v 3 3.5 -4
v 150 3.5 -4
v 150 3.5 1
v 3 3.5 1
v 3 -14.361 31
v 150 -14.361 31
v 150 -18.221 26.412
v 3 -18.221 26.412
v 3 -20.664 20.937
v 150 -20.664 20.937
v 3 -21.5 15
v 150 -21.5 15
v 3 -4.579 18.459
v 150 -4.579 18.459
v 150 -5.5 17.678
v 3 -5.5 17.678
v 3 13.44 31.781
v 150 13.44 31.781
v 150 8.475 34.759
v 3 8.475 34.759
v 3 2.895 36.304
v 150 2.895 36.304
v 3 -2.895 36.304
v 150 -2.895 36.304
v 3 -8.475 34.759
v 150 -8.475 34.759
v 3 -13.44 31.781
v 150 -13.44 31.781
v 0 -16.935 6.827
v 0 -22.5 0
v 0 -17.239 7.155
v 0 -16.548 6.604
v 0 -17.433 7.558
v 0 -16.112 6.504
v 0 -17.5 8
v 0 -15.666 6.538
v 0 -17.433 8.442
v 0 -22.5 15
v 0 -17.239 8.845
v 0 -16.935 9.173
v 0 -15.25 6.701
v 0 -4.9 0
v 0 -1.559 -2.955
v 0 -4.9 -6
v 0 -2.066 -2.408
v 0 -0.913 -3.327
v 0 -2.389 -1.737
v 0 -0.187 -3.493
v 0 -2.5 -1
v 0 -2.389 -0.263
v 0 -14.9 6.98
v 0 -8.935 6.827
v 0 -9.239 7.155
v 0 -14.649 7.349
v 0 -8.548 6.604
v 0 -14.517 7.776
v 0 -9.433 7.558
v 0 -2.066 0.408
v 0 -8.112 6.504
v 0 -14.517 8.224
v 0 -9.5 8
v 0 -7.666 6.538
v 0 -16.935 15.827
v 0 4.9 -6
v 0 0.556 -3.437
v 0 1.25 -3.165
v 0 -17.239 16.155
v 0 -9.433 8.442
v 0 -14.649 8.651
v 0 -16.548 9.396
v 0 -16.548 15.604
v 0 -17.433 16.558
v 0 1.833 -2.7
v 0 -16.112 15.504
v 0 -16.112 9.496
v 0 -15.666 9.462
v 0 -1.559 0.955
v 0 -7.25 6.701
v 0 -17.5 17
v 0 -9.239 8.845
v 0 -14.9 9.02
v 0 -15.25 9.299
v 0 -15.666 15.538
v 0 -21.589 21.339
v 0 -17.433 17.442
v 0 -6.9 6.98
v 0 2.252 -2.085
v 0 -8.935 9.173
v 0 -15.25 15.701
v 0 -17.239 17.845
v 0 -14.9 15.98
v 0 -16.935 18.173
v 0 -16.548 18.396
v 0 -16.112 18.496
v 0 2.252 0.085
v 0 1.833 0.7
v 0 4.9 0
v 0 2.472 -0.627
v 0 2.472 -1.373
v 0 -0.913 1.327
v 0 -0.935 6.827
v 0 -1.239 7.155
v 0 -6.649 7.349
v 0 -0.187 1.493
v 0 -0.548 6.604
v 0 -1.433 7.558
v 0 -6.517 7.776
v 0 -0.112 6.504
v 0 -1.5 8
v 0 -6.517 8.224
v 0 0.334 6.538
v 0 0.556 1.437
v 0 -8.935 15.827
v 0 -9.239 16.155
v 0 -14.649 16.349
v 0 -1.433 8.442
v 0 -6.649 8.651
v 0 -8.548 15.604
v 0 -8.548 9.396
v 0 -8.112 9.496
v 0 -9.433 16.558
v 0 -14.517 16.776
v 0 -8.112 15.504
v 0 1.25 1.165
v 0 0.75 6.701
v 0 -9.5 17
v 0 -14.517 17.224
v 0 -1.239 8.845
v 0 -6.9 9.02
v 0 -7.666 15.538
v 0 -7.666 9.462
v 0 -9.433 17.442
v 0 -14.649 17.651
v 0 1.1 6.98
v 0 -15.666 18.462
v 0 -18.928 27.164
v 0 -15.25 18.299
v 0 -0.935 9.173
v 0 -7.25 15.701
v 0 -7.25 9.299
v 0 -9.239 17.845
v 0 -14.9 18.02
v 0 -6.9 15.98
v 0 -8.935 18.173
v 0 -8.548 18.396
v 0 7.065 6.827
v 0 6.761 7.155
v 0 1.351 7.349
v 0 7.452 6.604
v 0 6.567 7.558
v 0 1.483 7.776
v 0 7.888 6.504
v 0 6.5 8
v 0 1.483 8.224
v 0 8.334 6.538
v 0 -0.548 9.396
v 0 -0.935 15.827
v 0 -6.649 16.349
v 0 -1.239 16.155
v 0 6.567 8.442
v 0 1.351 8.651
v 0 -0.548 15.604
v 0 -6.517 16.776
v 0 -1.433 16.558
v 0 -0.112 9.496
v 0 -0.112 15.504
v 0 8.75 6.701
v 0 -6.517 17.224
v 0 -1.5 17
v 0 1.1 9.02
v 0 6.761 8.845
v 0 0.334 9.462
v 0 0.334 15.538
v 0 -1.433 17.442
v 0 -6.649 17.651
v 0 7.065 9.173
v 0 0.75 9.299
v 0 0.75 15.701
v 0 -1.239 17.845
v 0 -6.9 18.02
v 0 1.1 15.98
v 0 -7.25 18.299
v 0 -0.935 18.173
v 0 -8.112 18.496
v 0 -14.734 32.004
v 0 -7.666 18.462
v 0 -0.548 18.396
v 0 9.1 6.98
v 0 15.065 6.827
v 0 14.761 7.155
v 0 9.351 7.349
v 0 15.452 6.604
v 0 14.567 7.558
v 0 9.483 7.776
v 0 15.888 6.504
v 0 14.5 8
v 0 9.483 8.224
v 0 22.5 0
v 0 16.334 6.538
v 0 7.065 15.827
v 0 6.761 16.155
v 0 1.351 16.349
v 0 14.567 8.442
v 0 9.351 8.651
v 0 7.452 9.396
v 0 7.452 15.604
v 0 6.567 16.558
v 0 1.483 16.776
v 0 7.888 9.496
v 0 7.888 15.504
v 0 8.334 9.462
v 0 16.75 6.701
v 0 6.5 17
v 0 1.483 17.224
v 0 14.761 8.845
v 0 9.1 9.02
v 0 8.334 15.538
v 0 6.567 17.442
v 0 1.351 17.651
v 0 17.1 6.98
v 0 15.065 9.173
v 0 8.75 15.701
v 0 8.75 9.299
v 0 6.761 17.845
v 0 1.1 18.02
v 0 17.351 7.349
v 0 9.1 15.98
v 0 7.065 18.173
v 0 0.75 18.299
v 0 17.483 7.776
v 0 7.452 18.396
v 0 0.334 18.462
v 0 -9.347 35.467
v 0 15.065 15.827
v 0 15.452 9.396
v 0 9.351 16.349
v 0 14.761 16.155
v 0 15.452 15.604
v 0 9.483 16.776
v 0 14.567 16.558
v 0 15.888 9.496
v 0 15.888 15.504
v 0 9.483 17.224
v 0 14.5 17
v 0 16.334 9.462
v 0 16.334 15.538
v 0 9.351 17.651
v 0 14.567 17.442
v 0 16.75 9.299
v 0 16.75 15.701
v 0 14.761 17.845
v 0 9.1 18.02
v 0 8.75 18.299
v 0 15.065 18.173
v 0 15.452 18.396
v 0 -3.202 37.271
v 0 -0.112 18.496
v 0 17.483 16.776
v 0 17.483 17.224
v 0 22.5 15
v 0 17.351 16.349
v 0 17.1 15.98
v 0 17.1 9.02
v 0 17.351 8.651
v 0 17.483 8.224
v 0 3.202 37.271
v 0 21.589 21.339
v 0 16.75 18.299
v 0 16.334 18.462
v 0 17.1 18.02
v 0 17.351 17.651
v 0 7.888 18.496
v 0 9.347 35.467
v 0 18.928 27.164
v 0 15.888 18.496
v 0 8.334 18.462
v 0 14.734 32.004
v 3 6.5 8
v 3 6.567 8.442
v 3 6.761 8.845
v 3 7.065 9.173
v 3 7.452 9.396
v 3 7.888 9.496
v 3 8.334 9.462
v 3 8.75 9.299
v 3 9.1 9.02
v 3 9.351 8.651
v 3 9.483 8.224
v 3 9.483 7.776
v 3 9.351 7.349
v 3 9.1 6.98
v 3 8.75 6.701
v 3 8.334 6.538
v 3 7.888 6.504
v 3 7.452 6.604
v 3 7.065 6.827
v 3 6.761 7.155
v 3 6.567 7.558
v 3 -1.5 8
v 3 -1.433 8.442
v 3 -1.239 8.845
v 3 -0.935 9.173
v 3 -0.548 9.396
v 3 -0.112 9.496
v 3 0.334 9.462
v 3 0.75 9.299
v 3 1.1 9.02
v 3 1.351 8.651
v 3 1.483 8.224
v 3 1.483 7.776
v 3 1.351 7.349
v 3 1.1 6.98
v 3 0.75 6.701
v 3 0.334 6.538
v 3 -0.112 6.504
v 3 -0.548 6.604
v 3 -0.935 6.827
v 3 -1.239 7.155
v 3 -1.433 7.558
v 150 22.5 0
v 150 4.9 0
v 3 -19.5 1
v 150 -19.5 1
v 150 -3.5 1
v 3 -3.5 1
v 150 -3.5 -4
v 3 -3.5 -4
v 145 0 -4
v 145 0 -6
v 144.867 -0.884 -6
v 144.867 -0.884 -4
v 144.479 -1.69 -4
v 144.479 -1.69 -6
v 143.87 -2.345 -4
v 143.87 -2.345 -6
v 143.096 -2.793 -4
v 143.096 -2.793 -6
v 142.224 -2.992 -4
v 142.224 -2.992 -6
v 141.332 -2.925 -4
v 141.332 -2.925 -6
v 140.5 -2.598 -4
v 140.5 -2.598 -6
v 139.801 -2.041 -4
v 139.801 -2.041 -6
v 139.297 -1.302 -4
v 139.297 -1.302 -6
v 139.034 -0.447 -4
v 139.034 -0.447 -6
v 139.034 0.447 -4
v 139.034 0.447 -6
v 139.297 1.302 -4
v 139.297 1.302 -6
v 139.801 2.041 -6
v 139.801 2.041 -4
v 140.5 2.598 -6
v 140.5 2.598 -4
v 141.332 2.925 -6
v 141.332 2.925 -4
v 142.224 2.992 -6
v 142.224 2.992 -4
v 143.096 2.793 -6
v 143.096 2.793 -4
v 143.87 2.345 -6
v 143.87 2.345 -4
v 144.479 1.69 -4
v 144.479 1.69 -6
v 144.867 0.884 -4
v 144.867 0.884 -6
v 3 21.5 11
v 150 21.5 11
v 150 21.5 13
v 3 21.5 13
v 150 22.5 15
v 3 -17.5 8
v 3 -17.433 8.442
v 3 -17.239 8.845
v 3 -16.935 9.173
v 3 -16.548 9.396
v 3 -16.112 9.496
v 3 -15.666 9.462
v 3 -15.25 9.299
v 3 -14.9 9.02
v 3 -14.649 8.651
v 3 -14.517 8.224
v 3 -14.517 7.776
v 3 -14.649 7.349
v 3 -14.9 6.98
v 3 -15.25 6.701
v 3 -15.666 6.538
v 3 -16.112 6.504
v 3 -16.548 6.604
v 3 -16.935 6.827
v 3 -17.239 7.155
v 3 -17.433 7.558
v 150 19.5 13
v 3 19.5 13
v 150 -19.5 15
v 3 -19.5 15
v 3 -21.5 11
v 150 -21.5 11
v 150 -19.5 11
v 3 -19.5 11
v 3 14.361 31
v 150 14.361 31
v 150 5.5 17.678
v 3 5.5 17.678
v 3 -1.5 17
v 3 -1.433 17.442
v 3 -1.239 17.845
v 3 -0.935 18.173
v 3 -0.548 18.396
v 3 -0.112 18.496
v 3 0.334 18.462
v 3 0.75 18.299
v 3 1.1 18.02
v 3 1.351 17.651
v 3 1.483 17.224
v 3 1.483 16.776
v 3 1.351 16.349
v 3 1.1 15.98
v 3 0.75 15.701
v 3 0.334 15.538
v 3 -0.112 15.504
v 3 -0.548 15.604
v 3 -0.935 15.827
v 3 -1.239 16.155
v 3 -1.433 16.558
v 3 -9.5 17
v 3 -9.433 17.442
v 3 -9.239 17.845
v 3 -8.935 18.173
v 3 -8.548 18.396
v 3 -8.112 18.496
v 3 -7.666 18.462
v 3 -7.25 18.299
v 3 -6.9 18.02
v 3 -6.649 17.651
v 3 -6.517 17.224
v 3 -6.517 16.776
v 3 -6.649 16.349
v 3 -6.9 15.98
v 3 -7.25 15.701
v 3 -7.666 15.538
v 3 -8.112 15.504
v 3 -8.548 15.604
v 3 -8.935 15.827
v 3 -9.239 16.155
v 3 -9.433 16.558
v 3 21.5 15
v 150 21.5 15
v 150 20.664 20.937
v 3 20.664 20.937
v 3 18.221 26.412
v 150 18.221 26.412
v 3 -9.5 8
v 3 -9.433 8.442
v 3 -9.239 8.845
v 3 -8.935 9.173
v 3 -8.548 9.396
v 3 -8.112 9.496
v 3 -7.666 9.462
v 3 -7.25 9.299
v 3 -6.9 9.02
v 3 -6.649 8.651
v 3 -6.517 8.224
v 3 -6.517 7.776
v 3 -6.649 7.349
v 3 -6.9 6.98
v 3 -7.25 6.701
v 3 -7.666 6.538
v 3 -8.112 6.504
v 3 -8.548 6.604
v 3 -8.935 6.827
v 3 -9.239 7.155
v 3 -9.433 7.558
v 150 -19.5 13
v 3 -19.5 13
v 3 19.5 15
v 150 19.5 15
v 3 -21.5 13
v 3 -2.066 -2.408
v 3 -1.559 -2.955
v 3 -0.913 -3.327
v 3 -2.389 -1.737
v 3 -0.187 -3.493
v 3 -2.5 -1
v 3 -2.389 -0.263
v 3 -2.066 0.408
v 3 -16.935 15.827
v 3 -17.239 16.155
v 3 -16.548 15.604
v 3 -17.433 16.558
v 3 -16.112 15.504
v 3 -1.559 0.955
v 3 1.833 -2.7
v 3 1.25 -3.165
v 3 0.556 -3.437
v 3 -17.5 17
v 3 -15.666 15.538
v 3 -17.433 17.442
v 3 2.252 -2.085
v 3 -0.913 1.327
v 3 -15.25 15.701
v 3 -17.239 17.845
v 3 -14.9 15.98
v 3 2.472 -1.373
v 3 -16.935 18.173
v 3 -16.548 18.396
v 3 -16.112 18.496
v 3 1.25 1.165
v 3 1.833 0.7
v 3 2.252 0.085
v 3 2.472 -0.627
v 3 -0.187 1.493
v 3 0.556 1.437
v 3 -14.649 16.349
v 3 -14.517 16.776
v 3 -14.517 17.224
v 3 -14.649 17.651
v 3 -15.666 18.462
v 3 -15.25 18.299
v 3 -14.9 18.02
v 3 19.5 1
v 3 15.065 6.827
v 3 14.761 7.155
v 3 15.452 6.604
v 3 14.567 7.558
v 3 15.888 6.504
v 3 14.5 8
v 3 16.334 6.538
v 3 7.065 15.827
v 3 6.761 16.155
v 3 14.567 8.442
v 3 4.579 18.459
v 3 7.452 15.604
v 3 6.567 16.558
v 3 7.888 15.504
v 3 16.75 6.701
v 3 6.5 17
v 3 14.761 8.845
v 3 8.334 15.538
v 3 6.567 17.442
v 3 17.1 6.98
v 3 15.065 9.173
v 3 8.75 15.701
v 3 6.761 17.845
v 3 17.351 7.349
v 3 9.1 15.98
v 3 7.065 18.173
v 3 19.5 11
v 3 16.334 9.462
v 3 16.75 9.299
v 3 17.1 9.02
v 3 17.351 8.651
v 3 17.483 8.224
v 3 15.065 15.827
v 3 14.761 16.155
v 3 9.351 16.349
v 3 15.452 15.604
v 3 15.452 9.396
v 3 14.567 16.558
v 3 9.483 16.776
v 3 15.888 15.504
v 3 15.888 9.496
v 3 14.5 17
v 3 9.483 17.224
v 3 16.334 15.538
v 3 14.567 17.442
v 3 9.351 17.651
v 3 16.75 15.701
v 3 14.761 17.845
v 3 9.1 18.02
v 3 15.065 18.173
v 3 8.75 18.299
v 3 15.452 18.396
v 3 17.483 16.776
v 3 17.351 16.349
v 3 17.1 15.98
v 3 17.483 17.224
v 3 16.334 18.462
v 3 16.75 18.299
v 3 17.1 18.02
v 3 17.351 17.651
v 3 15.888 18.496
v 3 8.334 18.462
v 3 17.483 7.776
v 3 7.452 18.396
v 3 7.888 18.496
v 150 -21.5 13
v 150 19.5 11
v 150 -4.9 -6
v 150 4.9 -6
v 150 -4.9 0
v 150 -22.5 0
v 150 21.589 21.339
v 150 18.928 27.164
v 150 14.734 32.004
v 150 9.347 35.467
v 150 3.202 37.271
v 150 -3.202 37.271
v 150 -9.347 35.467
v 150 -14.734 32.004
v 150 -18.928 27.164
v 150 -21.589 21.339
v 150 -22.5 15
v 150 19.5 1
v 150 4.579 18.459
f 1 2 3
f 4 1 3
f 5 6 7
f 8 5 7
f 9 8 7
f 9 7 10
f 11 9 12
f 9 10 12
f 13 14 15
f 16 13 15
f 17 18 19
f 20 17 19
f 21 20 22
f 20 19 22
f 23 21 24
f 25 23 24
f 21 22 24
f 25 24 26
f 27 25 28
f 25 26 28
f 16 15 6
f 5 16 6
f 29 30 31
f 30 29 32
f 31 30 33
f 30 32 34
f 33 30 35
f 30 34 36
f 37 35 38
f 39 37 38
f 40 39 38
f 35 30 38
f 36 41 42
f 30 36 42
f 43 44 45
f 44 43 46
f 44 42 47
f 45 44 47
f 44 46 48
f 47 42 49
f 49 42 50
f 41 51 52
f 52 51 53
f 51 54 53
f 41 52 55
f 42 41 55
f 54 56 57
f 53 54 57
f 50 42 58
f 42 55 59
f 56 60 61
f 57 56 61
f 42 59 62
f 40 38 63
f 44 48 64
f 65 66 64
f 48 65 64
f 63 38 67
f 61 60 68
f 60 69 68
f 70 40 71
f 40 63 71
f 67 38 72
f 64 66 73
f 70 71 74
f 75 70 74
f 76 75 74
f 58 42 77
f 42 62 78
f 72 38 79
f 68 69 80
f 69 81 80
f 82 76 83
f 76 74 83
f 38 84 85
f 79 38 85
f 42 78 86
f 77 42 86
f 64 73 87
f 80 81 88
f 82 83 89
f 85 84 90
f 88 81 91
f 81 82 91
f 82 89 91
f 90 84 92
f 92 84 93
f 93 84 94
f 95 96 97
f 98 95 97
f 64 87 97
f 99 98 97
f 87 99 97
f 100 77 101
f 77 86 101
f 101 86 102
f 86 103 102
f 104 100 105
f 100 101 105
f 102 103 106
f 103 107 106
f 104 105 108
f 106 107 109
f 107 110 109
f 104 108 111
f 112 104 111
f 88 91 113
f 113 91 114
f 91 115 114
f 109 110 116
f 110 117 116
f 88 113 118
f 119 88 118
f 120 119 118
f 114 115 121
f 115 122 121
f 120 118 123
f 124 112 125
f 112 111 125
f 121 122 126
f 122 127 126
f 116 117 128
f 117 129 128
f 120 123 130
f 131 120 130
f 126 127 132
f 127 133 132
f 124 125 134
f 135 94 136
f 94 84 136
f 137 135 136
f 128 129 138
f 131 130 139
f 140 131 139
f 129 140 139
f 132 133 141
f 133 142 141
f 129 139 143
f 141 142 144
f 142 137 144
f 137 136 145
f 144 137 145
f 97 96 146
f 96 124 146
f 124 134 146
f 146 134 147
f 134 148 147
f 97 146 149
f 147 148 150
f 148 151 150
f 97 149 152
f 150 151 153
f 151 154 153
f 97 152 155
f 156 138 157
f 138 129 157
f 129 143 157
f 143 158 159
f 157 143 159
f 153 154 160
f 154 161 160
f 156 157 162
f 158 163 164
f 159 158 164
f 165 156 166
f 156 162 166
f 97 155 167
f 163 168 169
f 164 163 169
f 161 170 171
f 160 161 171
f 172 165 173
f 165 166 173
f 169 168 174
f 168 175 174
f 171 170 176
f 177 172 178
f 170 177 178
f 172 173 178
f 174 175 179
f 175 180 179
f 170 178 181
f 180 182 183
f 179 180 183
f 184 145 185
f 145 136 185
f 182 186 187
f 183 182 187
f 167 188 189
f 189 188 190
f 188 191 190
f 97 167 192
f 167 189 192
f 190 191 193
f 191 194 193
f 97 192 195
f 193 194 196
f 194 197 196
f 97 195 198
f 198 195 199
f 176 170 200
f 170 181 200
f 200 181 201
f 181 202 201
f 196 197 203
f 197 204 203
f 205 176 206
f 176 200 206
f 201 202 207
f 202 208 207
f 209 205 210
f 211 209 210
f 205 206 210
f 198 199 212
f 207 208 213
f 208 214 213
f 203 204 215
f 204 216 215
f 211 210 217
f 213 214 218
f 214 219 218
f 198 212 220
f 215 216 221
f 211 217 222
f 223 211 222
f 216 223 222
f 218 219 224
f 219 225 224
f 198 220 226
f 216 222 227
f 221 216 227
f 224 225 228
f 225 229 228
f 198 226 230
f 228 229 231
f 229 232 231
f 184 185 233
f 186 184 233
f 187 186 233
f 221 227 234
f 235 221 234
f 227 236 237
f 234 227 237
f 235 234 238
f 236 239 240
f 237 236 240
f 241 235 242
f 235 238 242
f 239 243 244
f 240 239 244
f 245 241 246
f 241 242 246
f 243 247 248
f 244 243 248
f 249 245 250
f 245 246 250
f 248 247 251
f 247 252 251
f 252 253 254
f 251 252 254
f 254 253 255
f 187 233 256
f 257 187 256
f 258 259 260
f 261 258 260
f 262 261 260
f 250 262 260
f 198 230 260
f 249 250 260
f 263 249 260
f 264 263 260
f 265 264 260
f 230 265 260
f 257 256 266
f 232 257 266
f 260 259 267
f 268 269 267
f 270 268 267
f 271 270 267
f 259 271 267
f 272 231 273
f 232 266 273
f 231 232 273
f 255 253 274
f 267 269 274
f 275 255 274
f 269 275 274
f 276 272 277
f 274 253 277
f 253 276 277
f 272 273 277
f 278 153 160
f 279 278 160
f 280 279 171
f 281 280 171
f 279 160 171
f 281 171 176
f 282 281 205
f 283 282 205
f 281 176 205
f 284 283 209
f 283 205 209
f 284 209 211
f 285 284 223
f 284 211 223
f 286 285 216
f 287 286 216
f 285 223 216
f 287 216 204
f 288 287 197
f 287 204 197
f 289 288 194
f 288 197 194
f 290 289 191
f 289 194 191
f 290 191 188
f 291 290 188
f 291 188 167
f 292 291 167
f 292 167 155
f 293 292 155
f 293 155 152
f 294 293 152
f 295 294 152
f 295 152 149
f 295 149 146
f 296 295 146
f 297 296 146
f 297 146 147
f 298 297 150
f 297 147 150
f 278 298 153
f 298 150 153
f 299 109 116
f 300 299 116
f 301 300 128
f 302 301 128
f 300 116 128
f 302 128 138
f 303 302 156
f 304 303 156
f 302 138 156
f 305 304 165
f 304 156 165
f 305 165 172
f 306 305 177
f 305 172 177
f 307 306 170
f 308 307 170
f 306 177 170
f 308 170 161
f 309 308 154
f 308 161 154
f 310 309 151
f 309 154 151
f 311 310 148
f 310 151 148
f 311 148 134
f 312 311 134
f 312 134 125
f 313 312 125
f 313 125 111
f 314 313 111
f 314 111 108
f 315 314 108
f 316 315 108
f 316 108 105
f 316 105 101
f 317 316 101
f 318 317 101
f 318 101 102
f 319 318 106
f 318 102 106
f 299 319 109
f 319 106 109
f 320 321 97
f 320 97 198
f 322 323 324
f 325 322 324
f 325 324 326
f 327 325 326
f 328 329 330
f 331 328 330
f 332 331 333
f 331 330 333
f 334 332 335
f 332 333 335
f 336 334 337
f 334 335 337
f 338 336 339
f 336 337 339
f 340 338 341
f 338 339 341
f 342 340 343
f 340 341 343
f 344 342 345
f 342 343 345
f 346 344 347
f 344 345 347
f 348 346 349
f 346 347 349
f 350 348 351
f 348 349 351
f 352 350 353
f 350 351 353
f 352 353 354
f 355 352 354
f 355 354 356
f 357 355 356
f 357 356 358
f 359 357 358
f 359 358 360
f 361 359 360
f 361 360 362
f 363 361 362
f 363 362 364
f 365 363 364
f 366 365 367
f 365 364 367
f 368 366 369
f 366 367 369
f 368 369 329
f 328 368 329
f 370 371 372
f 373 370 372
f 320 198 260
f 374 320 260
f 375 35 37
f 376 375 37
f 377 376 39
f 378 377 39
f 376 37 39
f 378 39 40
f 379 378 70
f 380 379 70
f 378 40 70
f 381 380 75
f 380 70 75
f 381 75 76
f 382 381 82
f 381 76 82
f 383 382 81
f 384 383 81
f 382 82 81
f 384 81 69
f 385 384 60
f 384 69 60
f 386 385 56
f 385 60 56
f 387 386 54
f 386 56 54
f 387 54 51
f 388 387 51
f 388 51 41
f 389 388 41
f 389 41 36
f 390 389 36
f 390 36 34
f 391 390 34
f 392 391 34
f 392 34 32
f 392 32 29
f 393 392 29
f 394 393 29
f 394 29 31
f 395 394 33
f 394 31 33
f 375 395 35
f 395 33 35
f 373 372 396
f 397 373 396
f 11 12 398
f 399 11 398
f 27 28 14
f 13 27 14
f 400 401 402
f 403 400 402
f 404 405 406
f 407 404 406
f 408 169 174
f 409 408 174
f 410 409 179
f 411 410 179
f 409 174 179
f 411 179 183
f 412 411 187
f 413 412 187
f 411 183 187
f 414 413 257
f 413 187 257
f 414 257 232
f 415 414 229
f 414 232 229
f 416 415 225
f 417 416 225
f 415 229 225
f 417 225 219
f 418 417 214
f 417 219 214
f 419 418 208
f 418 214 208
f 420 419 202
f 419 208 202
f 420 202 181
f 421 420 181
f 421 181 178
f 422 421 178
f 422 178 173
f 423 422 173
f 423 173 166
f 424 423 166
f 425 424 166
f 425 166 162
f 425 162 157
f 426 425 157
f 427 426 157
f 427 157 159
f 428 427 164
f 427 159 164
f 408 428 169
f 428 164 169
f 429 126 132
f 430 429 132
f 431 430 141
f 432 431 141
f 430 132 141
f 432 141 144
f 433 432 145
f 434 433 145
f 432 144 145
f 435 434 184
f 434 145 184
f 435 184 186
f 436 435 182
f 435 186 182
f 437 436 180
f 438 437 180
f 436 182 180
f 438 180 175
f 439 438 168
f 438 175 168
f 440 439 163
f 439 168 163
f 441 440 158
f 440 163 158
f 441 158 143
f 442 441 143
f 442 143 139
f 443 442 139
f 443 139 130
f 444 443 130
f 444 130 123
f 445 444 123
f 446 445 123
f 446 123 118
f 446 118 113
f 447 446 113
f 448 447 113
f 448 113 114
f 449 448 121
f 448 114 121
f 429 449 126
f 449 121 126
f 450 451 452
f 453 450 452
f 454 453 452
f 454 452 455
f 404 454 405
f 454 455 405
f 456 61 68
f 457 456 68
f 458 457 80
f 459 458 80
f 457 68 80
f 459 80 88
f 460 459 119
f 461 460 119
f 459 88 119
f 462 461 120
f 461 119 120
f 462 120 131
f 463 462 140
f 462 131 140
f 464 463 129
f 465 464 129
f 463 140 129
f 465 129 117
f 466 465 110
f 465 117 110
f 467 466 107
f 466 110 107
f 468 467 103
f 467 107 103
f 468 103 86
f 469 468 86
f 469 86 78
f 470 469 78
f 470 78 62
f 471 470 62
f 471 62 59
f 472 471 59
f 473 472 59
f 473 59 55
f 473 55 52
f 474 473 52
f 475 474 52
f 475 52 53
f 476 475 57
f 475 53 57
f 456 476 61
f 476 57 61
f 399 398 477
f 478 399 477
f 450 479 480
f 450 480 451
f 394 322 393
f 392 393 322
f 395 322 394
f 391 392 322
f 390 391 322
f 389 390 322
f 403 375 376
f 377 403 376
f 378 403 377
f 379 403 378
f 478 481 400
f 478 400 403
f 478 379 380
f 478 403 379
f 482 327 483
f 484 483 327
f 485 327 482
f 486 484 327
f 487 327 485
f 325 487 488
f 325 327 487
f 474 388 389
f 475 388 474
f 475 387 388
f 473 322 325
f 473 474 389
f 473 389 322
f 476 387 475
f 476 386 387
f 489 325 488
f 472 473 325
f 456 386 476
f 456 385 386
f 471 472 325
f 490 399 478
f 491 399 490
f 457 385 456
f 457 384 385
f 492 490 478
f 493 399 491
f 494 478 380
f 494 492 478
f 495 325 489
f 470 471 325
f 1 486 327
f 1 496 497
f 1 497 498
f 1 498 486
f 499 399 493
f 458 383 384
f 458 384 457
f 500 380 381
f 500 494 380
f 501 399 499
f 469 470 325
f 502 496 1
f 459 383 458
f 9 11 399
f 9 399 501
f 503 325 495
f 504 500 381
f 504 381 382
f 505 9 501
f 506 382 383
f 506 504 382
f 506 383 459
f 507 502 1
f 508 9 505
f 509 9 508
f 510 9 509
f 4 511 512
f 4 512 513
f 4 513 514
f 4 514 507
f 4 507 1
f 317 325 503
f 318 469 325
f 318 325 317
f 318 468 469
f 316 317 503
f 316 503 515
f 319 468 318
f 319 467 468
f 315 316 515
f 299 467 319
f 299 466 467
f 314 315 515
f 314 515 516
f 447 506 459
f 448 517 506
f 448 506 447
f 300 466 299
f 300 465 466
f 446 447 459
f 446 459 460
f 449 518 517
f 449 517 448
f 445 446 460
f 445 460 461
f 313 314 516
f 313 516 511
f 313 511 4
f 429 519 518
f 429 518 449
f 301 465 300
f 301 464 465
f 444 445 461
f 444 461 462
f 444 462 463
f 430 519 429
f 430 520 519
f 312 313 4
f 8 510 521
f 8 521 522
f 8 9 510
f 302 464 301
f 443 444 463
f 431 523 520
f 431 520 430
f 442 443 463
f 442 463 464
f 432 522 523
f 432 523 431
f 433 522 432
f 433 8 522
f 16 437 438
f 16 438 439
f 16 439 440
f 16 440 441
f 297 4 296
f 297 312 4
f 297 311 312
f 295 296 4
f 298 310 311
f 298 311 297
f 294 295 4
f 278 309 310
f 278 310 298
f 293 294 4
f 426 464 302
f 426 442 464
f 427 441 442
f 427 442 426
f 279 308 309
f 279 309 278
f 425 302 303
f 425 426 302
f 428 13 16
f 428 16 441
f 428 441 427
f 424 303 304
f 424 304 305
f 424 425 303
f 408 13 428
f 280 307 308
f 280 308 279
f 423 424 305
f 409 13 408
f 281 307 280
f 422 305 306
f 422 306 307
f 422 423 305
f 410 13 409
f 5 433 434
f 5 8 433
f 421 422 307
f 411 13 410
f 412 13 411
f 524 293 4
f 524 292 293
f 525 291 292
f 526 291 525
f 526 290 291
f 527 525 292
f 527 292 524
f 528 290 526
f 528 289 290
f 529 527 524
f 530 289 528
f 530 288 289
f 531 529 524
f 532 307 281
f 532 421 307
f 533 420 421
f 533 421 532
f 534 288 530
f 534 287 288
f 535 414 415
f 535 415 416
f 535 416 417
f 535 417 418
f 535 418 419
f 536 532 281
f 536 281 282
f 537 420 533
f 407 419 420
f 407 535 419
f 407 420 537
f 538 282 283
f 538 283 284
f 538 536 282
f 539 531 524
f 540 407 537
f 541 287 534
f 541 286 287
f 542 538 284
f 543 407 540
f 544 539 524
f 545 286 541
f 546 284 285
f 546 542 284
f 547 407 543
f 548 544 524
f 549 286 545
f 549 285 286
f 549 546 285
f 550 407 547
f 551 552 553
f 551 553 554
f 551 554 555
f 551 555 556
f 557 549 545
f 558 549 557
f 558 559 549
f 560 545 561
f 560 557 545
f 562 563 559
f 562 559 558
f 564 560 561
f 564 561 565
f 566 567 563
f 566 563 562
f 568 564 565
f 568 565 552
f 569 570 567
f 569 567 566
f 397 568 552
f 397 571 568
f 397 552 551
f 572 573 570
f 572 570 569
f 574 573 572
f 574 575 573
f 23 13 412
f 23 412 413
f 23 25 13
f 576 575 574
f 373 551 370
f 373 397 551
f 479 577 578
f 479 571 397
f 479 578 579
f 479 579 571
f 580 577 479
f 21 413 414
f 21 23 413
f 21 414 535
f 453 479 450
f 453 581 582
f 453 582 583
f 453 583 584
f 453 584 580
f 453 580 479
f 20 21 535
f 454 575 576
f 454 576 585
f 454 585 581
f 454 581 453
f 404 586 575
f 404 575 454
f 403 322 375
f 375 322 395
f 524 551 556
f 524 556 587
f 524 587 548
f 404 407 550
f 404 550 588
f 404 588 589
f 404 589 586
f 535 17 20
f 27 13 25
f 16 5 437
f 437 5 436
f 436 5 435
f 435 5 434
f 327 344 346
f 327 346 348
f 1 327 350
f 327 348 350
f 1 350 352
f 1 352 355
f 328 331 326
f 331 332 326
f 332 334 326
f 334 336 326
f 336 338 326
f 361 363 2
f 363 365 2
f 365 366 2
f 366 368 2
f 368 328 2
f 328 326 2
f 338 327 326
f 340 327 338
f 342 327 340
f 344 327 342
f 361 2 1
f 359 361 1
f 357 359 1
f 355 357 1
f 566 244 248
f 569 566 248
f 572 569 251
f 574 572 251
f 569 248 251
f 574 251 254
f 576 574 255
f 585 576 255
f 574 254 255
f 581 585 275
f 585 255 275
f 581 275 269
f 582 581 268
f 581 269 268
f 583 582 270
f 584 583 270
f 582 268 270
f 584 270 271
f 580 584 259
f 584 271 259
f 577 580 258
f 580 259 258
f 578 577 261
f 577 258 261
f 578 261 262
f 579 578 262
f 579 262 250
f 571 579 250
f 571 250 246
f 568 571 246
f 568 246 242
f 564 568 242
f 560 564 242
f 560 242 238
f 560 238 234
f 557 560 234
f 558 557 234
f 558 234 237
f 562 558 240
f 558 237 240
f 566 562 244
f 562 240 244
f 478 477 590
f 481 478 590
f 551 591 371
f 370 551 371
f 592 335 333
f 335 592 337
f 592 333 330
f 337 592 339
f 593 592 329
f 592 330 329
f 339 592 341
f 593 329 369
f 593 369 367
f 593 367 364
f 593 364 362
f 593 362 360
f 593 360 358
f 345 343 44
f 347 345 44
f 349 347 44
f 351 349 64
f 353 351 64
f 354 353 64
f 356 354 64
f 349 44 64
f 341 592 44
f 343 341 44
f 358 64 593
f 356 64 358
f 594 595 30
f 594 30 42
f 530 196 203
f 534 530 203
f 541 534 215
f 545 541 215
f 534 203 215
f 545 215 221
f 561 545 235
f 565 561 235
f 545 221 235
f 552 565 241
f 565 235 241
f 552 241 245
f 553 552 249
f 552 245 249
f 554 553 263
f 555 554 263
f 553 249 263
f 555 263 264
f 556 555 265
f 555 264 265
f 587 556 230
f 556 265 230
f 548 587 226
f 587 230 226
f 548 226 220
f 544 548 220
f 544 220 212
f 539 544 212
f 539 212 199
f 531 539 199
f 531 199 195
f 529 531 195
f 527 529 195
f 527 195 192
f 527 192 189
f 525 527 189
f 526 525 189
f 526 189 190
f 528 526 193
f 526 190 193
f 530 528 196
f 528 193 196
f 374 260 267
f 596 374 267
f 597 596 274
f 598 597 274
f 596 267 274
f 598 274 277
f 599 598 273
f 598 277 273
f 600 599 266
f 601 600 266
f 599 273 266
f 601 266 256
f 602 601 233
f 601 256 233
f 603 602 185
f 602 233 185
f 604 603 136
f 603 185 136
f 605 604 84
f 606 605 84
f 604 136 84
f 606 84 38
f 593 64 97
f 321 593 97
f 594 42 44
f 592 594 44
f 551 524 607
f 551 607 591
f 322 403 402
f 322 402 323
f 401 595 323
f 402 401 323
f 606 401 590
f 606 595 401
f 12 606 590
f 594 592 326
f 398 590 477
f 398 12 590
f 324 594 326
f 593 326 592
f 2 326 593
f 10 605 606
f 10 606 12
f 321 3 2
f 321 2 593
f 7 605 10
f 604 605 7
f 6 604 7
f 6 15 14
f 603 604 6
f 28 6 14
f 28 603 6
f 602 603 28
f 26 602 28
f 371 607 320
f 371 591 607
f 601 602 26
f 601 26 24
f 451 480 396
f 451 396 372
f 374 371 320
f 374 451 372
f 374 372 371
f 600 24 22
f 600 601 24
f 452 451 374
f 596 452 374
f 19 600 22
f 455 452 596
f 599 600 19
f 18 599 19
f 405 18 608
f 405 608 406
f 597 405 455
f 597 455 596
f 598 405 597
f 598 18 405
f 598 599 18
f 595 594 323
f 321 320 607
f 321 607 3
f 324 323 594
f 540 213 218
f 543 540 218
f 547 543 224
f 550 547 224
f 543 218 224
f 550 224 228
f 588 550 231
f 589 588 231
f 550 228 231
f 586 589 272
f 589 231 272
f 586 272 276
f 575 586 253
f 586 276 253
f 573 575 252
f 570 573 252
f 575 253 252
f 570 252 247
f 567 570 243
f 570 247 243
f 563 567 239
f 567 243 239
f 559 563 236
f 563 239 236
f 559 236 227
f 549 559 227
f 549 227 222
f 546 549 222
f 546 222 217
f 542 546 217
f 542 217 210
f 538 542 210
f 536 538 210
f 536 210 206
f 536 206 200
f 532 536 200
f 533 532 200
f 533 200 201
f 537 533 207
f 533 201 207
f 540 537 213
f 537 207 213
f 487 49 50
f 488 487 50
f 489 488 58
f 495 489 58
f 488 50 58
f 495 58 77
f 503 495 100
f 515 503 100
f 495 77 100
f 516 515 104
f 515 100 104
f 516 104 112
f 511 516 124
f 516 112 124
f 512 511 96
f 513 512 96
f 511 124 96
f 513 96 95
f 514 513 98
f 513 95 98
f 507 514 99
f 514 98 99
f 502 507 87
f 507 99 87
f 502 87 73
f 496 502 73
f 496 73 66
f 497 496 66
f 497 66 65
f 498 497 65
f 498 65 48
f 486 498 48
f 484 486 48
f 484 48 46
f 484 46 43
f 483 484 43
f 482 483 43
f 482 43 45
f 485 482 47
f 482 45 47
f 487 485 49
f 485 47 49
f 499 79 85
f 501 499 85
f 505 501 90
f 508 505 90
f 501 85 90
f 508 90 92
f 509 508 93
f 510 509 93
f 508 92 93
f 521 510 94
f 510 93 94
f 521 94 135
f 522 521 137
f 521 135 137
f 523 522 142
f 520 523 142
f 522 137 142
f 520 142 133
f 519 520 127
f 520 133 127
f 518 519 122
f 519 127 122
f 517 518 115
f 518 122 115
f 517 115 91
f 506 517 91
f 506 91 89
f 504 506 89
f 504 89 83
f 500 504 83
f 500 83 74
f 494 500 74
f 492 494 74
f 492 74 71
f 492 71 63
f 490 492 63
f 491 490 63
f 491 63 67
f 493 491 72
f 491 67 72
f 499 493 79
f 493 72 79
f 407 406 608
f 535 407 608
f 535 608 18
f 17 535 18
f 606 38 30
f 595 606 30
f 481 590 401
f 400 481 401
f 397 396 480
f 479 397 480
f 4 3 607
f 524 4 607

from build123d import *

# Parameters (mm, degrees)
F1_DEPTH = 150
F3_DEPTH = 147
F4_R     = 2.5
F5_DEPTH = 3
F6_R     = 1.5
F7_DEPTH = 3
F8_R     = 3
F9_DEPTH = 2


with BuildPart() as f1:
    # F0 (on Right) → F1 (new body)
    with BuildSketch(Plane.YZ):
        with BuildLine():
            Line((-22.5, 15), (-22.5, 0))
            Line((-22.5, 0), (-4.9, 0))
            Line((-4.9, 0), (-4.9, -6))
            Line((-4.9, -6), (4.9, -6))
            Line((4.9, -6), (4.9, 0))
            Line((4.9, 0), (22.5, 0))
            Line((22.5, 0), (22.5, 15))
            ThreePointArc((22.5, 15), (0, 37.5), (-22.5, 15))
        make_face()
    extrude(amount=F1_DEPTH)

    # F2 (on face) → F3 (cut)
    with BuildSketch(Plane.YZ.offset(150)):
        with BuildLine():
            Line((-19.5, 11), (-19.5, 1))
            Line((-19.5, 1), (-3.5, 1))
            Line((-3.5, 1), (-3.5, -4))
            Line((-3.5, -4), (3.5, -4))
            Line((3.5, -4), (3.5, 1))
            Line((3.5, 1), (19.5, 1))
            Line((19.5, 1), (19.5, 11))
            Line((19.5, 11), (21.5, 11))
            Line((21.5, 11), (21.5, 13))
            Line((21.5, 13), (19.5, 13))
            Line((19.5, 13), (19.5, 15))
            Line((19.5, 15), (21.5, 15))
            ThreePointArc((21.5, 15), (19.634412, 23.76013), (14.361407, 31))
            Line((14.361407, 31), (5.5, 17.678008))
            Line((5.5, 17.678008), (4.578571, 18.459456))
            Line((4.578571, 18.459456), (13.439978, 31.781448))
            ThreePointArc((13.439978, 31.781448), (0, 36.5), (-13.439978, 31.781448))
            Line((-13.439978, 31.781448), (-4.578571, 18.459456))
            Line((-4.578571, 18.459456), (-5.5, 17.678008))
            Line((-5.5, 17.678008), (-14.361407, 31))
            ThreePointArc((-14.361407, 31), (-19.634412, 23.76013), (-21.5, 15))
            Line((-21.5, 15), (-19.5, 15))
            Line((-19.5, 15), (-19.5, 13))
            Line((-19.5, 13), (-21.5, 13))
            Line((-21.5, 13), (-21.5, 11))
            Line((-21.5, 11), (-19.5, 11))
        make_face()
    extrude(amount=-F3_DEPTH, mode=Mode.SUBTRACT)

    # F4 (on face) → F5 (cut, through all)
    with BuildSketch(Plane(origin=(0, 0, 0), x_dir=(0, -1, 0), z_dir=(-1, 0, 0))):
        with Locations((0, -1)):
            Circle(F4_R)
    extrude(amount=-F5_DEPTH, mode=Mode.SUBTRACT)

    # F6 (on face) → F7 (cut, through all)
    with BuildSketch(Plane(origin=(0, 0, 0), x_dir=(0, -1, 0), z_dir=(-1, 0, 0))):
        with Locations((-16, 8)):
            Circle(F6_R)
        with Locations((-16, 17)):
            Circle(F6_R)
        with Locations((-8, 8)):
            Circle(F6_R)
        with Locations((-8, 17)):
            Circle(F6_R)
        with Locations((0, 8)):
            Circle(F6_R)
        with Locations((0, 17)):
            Circle(F6_R)
        with Locations((8, 8)):
            Circle(F6_R)
        with Locations((8, 17)):
            Circle(F6_R)
        with Locations((16, 8)):
            Circle(F6_R)
        with Locations((16, 17)):
            Circle(F6_R)
    extrude(amount=-F7_DEPTH, mode=Mode.SUBTRACT)

    # F8 (on face) → F9 (cut, through all)
    with BuildSketch(Plane(origin=(0, 0, -6), x_dir=(1, 0, 0), z_dir=(0, 0, -1))):
        with Locations((142, 0)):
            Circle(F8_R)
    extrude(amount=-F9_DEPTH, mode=Mode.SUBTRACT)


solid = f1.part
